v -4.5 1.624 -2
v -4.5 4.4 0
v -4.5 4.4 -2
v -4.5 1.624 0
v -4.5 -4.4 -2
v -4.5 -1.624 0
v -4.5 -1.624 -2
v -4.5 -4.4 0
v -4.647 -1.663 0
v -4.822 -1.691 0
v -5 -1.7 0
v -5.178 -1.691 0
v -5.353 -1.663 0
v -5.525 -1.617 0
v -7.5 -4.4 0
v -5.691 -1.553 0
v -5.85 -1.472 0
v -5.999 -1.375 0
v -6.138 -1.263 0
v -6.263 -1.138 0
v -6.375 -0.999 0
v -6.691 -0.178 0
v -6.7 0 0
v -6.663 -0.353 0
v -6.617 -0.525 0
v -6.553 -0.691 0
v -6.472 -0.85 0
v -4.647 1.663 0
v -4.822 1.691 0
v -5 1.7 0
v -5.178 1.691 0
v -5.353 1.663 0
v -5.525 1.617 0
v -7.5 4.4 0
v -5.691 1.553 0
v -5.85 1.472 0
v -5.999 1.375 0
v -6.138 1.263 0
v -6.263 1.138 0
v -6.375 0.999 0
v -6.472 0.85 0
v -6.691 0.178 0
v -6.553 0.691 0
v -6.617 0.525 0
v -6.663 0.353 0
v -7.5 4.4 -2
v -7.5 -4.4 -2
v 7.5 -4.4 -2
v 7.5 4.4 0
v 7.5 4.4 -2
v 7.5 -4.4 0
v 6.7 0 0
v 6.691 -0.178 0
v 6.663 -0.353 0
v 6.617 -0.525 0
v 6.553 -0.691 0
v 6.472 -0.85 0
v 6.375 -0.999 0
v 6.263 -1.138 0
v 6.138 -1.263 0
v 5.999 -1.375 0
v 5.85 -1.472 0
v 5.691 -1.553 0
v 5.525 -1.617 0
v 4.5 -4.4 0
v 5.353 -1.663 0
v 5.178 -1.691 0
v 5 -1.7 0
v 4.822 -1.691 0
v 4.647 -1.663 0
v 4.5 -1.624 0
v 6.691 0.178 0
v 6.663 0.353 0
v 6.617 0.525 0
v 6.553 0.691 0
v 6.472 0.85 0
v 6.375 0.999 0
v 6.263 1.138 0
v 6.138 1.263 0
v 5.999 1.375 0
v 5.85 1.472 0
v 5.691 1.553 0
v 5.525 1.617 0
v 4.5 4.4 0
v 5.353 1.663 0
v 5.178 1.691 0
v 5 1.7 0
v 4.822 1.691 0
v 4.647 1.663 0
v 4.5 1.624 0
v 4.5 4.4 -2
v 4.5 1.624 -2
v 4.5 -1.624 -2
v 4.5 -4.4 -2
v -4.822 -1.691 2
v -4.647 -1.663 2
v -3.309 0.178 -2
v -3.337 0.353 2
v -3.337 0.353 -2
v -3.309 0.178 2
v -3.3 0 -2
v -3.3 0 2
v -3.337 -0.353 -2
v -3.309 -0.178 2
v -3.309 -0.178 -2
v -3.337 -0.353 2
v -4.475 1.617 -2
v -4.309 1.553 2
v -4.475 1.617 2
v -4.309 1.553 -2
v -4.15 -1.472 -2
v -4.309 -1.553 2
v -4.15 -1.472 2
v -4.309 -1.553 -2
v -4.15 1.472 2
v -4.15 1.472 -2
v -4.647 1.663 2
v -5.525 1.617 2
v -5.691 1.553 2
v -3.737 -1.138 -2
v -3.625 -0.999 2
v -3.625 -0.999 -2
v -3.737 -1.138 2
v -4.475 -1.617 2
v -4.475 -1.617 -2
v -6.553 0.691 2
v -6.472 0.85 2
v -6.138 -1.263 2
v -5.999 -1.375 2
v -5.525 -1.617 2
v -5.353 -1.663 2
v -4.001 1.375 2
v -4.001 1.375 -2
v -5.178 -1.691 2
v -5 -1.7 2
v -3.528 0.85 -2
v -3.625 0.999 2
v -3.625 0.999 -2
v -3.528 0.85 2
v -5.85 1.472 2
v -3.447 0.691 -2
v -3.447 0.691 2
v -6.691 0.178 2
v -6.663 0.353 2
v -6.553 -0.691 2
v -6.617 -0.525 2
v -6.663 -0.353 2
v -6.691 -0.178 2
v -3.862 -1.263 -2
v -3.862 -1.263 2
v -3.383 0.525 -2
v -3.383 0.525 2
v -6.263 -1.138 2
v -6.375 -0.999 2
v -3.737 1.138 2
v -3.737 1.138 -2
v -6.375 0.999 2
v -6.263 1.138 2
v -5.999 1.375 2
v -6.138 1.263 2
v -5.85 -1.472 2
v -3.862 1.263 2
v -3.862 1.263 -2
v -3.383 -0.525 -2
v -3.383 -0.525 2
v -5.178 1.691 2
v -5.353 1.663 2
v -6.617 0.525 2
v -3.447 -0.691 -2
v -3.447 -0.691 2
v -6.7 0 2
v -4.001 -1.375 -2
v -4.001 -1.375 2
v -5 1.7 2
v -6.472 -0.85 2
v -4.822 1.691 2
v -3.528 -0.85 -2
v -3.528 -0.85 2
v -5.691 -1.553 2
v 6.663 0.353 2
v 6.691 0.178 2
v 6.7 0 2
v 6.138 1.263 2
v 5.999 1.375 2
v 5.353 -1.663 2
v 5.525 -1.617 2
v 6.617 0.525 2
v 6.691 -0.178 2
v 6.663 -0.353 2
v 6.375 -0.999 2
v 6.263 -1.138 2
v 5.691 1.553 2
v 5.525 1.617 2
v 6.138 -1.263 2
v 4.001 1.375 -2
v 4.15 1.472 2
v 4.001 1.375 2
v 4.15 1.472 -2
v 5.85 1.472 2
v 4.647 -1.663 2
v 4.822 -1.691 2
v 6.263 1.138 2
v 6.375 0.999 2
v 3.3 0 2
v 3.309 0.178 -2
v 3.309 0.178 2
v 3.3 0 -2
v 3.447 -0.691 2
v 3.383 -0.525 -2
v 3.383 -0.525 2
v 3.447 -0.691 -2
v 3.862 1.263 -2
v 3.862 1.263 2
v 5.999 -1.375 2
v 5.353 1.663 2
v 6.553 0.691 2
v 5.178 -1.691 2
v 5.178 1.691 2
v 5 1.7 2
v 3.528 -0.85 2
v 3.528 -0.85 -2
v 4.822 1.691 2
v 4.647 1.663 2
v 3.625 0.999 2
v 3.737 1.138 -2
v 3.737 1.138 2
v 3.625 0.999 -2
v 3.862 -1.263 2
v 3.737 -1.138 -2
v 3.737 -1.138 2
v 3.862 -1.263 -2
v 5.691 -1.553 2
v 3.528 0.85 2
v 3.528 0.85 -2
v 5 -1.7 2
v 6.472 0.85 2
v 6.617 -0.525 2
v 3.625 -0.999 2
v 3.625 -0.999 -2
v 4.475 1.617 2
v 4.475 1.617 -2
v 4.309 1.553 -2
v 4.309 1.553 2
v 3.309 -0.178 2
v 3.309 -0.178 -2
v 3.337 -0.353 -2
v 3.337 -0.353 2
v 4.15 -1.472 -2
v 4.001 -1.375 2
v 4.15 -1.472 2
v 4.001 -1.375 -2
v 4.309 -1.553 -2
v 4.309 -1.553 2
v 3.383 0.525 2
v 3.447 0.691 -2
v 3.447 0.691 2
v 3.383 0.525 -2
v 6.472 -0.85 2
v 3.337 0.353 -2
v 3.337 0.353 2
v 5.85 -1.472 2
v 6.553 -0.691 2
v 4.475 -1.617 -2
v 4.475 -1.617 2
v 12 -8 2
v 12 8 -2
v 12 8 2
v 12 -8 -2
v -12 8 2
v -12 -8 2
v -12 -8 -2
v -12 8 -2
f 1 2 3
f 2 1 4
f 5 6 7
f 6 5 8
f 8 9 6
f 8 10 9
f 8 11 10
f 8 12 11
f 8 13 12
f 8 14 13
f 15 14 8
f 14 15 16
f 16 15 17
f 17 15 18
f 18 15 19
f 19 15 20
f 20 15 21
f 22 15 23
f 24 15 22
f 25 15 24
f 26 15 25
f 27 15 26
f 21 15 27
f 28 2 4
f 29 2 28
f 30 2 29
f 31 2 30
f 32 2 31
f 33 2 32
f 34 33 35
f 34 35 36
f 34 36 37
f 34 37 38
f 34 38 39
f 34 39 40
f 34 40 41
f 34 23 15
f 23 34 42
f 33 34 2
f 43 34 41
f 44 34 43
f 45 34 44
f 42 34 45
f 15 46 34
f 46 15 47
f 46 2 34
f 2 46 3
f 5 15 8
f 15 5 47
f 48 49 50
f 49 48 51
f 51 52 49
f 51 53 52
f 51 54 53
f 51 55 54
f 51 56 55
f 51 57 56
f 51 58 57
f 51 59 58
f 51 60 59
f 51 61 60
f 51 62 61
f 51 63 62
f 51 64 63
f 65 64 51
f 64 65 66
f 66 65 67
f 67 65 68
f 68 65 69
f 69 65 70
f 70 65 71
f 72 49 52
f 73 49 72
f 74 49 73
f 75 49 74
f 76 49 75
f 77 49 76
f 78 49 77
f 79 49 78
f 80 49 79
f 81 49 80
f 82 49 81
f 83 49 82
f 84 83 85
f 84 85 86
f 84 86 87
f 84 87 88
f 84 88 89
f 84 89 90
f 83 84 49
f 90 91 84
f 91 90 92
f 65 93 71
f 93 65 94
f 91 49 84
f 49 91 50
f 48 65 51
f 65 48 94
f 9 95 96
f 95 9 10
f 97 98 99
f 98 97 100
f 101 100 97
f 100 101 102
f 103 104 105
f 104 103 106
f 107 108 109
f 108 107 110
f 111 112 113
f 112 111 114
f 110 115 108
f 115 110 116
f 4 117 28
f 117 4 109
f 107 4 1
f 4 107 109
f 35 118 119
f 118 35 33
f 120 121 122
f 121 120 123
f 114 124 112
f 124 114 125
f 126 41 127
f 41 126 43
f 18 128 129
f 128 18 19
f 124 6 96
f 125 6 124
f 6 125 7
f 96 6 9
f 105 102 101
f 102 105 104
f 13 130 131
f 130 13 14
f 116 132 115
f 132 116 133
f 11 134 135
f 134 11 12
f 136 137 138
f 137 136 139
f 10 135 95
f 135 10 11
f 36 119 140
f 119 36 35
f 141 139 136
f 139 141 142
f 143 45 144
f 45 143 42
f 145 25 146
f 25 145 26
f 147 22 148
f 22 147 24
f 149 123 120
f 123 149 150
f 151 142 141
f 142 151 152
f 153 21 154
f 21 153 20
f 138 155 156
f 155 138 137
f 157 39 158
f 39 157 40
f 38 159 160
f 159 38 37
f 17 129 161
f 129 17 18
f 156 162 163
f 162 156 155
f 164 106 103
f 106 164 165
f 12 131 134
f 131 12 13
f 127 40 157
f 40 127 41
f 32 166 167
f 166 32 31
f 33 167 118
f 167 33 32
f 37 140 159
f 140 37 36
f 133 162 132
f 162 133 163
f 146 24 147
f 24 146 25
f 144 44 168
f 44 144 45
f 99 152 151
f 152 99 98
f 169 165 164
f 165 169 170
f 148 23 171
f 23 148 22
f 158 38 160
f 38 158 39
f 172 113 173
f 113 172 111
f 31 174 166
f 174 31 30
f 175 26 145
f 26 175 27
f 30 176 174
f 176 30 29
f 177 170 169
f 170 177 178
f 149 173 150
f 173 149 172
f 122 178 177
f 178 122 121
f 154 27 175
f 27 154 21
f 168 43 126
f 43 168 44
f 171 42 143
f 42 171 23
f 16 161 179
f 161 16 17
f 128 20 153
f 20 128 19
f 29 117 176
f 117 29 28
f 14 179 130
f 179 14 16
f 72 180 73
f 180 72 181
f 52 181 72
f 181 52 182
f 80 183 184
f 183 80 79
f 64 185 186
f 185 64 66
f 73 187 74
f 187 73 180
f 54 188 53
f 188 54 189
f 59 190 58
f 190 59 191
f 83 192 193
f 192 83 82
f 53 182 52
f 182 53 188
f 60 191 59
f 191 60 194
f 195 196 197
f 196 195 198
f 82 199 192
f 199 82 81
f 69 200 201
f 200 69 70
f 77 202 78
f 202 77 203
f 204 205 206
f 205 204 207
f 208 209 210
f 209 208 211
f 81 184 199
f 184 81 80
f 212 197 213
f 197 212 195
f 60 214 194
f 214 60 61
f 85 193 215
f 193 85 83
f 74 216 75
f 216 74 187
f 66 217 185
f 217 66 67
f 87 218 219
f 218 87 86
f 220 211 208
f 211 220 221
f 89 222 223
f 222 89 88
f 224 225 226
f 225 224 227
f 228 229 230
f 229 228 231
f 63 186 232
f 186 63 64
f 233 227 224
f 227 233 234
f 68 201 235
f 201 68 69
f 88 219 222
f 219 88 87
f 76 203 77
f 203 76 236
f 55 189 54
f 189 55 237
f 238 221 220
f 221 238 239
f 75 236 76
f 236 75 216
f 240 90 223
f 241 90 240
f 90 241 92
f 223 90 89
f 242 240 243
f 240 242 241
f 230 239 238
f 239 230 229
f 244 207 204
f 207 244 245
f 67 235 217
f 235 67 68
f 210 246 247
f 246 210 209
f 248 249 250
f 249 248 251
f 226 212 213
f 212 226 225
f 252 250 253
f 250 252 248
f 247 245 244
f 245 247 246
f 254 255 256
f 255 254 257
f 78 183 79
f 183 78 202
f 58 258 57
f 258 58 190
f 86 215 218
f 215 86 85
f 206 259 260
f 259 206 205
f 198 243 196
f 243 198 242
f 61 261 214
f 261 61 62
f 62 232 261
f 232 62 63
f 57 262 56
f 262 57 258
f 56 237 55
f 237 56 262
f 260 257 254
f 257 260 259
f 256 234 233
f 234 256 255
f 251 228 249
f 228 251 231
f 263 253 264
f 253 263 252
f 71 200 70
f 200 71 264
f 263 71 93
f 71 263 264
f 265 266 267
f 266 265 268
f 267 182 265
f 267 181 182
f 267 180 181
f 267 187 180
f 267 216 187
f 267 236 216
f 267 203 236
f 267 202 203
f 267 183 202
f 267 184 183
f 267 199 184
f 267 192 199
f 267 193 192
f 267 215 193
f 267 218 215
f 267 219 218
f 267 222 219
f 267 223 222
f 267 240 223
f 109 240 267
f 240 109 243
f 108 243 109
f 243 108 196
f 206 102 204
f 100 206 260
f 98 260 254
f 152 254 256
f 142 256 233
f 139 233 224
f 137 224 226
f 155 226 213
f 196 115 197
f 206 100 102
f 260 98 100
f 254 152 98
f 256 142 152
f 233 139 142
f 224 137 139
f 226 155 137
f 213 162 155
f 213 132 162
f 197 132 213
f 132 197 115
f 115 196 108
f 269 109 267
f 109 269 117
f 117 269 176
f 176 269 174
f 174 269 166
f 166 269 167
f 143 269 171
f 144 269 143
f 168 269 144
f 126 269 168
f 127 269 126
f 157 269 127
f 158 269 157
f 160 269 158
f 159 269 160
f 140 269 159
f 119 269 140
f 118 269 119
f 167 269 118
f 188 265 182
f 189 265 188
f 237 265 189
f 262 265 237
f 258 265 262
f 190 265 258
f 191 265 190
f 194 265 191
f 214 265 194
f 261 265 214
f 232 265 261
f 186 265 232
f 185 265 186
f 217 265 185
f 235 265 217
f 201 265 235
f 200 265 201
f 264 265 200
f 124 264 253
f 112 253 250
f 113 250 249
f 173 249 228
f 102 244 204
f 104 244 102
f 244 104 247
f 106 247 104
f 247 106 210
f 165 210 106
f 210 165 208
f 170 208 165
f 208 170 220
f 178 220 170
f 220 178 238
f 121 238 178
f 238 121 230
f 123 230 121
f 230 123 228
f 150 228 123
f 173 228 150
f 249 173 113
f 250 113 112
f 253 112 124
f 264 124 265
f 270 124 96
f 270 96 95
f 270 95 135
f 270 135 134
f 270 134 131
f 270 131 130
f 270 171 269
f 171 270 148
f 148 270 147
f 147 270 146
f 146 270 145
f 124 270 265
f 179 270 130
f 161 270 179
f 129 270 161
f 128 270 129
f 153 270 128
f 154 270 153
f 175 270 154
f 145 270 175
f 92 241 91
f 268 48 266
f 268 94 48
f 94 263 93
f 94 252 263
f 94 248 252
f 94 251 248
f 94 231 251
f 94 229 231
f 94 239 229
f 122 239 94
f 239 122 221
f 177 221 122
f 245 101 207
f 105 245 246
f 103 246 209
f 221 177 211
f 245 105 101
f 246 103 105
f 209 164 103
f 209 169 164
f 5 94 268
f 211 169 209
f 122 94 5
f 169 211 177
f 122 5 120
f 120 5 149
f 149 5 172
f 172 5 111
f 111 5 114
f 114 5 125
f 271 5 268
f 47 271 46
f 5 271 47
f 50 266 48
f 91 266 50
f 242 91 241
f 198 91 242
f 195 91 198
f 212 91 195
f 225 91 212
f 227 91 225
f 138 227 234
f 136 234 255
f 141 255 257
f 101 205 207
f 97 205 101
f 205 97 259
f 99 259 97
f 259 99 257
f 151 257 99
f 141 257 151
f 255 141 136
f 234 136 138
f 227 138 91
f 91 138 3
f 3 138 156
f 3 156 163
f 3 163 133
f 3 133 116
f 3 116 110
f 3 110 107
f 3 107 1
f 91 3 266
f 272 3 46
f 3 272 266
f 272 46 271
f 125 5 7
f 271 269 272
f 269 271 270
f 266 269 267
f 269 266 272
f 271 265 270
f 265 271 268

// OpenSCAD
// Cable-tie base with two strap slots.
$fn = 60;
eps = 0.02;
base_w = 16;
base_l = 24;
base_t = 4;
slot_w = 3;
slot_l = 12;
difference() {
    cube([base_l,base_w,base_t],center=true);
    for (x=[-slot_l/2,slot_l/2]) translate([x,0,-base_t/2-eps]) cube([slot_w,base_w*0.55,base_t+2*eps],center=true);
    for (x=[-base_l/2+7,base_l/2-7]) translate([x,0,-base_t/2-eps]) cylinder(d=3.4,h=base_t+2*eps);
}
